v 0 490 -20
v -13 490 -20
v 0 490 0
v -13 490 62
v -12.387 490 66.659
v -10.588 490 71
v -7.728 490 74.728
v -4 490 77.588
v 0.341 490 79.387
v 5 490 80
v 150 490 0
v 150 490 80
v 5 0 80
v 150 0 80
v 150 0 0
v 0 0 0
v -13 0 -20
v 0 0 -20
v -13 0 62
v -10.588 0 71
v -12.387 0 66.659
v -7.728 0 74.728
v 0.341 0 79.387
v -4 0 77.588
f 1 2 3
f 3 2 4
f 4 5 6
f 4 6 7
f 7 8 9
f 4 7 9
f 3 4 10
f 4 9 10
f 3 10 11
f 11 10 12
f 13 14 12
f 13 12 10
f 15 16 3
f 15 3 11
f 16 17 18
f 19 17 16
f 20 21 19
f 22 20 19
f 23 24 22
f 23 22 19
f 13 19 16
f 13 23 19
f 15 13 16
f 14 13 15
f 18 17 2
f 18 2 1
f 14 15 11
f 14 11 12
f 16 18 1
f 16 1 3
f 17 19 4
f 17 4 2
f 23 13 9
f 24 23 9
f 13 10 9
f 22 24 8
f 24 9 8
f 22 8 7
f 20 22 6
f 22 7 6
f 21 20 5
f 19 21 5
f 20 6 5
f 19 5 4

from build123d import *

# Parameters (mm, degrees)
PAD_DEPTH = 490
FILLET_R  = 18


with BuildPart() as part:
    # Sketch → Pad (new body)
    with BuildSketch(Plane.XZ):
        Polygon((0, 0), (150, 0), (150, 80), (0, 80), (-13, 80), (-13, -20), (0, -20), align=None)
    extrude(amount=-PAD_DEPTH)

    # Fillet
    fillet_edges = [part.edges().sort_by_distance(p)[0] for p in [
        (-13, 245, 80),
    ]]
    fillet(fillet_edges, radius=FILLET_R)


solid = part.part
